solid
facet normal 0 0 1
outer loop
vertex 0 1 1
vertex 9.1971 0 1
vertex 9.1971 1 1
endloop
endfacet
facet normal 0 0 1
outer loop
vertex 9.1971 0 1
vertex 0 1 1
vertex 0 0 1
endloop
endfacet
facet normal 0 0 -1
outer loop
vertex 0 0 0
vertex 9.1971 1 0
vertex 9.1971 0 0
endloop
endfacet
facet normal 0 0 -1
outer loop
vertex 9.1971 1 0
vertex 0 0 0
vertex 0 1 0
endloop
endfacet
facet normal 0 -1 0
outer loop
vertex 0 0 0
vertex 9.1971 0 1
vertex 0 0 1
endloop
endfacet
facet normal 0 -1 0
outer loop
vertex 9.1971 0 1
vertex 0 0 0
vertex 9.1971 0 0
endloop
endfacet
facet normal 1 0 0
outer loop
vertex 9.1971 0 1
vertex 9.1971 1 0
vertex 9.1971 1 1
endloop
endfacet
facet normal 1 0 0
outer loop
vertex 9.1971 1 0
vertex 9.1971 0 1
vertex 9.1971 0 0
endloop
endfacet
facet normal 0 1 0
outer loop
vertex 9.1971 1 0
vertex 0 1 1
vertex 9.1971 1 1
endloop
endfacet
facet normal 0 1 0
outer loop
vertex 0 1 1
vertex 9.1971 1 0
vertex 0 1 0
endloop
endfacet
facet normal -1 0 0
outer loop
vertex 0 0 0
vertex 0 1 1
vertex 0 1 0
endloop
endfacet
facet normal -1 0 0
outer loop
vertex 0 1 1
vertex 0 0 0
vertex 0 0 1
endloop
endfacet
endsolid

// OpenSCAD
function gen_length(max_length) = rands(0,max_length,1)[0];

module step1(max_length=10, height=1)
    {
        length = gen_length(max_length);
        cube([length, height, height]);
    };
    
step1(10, 1);
